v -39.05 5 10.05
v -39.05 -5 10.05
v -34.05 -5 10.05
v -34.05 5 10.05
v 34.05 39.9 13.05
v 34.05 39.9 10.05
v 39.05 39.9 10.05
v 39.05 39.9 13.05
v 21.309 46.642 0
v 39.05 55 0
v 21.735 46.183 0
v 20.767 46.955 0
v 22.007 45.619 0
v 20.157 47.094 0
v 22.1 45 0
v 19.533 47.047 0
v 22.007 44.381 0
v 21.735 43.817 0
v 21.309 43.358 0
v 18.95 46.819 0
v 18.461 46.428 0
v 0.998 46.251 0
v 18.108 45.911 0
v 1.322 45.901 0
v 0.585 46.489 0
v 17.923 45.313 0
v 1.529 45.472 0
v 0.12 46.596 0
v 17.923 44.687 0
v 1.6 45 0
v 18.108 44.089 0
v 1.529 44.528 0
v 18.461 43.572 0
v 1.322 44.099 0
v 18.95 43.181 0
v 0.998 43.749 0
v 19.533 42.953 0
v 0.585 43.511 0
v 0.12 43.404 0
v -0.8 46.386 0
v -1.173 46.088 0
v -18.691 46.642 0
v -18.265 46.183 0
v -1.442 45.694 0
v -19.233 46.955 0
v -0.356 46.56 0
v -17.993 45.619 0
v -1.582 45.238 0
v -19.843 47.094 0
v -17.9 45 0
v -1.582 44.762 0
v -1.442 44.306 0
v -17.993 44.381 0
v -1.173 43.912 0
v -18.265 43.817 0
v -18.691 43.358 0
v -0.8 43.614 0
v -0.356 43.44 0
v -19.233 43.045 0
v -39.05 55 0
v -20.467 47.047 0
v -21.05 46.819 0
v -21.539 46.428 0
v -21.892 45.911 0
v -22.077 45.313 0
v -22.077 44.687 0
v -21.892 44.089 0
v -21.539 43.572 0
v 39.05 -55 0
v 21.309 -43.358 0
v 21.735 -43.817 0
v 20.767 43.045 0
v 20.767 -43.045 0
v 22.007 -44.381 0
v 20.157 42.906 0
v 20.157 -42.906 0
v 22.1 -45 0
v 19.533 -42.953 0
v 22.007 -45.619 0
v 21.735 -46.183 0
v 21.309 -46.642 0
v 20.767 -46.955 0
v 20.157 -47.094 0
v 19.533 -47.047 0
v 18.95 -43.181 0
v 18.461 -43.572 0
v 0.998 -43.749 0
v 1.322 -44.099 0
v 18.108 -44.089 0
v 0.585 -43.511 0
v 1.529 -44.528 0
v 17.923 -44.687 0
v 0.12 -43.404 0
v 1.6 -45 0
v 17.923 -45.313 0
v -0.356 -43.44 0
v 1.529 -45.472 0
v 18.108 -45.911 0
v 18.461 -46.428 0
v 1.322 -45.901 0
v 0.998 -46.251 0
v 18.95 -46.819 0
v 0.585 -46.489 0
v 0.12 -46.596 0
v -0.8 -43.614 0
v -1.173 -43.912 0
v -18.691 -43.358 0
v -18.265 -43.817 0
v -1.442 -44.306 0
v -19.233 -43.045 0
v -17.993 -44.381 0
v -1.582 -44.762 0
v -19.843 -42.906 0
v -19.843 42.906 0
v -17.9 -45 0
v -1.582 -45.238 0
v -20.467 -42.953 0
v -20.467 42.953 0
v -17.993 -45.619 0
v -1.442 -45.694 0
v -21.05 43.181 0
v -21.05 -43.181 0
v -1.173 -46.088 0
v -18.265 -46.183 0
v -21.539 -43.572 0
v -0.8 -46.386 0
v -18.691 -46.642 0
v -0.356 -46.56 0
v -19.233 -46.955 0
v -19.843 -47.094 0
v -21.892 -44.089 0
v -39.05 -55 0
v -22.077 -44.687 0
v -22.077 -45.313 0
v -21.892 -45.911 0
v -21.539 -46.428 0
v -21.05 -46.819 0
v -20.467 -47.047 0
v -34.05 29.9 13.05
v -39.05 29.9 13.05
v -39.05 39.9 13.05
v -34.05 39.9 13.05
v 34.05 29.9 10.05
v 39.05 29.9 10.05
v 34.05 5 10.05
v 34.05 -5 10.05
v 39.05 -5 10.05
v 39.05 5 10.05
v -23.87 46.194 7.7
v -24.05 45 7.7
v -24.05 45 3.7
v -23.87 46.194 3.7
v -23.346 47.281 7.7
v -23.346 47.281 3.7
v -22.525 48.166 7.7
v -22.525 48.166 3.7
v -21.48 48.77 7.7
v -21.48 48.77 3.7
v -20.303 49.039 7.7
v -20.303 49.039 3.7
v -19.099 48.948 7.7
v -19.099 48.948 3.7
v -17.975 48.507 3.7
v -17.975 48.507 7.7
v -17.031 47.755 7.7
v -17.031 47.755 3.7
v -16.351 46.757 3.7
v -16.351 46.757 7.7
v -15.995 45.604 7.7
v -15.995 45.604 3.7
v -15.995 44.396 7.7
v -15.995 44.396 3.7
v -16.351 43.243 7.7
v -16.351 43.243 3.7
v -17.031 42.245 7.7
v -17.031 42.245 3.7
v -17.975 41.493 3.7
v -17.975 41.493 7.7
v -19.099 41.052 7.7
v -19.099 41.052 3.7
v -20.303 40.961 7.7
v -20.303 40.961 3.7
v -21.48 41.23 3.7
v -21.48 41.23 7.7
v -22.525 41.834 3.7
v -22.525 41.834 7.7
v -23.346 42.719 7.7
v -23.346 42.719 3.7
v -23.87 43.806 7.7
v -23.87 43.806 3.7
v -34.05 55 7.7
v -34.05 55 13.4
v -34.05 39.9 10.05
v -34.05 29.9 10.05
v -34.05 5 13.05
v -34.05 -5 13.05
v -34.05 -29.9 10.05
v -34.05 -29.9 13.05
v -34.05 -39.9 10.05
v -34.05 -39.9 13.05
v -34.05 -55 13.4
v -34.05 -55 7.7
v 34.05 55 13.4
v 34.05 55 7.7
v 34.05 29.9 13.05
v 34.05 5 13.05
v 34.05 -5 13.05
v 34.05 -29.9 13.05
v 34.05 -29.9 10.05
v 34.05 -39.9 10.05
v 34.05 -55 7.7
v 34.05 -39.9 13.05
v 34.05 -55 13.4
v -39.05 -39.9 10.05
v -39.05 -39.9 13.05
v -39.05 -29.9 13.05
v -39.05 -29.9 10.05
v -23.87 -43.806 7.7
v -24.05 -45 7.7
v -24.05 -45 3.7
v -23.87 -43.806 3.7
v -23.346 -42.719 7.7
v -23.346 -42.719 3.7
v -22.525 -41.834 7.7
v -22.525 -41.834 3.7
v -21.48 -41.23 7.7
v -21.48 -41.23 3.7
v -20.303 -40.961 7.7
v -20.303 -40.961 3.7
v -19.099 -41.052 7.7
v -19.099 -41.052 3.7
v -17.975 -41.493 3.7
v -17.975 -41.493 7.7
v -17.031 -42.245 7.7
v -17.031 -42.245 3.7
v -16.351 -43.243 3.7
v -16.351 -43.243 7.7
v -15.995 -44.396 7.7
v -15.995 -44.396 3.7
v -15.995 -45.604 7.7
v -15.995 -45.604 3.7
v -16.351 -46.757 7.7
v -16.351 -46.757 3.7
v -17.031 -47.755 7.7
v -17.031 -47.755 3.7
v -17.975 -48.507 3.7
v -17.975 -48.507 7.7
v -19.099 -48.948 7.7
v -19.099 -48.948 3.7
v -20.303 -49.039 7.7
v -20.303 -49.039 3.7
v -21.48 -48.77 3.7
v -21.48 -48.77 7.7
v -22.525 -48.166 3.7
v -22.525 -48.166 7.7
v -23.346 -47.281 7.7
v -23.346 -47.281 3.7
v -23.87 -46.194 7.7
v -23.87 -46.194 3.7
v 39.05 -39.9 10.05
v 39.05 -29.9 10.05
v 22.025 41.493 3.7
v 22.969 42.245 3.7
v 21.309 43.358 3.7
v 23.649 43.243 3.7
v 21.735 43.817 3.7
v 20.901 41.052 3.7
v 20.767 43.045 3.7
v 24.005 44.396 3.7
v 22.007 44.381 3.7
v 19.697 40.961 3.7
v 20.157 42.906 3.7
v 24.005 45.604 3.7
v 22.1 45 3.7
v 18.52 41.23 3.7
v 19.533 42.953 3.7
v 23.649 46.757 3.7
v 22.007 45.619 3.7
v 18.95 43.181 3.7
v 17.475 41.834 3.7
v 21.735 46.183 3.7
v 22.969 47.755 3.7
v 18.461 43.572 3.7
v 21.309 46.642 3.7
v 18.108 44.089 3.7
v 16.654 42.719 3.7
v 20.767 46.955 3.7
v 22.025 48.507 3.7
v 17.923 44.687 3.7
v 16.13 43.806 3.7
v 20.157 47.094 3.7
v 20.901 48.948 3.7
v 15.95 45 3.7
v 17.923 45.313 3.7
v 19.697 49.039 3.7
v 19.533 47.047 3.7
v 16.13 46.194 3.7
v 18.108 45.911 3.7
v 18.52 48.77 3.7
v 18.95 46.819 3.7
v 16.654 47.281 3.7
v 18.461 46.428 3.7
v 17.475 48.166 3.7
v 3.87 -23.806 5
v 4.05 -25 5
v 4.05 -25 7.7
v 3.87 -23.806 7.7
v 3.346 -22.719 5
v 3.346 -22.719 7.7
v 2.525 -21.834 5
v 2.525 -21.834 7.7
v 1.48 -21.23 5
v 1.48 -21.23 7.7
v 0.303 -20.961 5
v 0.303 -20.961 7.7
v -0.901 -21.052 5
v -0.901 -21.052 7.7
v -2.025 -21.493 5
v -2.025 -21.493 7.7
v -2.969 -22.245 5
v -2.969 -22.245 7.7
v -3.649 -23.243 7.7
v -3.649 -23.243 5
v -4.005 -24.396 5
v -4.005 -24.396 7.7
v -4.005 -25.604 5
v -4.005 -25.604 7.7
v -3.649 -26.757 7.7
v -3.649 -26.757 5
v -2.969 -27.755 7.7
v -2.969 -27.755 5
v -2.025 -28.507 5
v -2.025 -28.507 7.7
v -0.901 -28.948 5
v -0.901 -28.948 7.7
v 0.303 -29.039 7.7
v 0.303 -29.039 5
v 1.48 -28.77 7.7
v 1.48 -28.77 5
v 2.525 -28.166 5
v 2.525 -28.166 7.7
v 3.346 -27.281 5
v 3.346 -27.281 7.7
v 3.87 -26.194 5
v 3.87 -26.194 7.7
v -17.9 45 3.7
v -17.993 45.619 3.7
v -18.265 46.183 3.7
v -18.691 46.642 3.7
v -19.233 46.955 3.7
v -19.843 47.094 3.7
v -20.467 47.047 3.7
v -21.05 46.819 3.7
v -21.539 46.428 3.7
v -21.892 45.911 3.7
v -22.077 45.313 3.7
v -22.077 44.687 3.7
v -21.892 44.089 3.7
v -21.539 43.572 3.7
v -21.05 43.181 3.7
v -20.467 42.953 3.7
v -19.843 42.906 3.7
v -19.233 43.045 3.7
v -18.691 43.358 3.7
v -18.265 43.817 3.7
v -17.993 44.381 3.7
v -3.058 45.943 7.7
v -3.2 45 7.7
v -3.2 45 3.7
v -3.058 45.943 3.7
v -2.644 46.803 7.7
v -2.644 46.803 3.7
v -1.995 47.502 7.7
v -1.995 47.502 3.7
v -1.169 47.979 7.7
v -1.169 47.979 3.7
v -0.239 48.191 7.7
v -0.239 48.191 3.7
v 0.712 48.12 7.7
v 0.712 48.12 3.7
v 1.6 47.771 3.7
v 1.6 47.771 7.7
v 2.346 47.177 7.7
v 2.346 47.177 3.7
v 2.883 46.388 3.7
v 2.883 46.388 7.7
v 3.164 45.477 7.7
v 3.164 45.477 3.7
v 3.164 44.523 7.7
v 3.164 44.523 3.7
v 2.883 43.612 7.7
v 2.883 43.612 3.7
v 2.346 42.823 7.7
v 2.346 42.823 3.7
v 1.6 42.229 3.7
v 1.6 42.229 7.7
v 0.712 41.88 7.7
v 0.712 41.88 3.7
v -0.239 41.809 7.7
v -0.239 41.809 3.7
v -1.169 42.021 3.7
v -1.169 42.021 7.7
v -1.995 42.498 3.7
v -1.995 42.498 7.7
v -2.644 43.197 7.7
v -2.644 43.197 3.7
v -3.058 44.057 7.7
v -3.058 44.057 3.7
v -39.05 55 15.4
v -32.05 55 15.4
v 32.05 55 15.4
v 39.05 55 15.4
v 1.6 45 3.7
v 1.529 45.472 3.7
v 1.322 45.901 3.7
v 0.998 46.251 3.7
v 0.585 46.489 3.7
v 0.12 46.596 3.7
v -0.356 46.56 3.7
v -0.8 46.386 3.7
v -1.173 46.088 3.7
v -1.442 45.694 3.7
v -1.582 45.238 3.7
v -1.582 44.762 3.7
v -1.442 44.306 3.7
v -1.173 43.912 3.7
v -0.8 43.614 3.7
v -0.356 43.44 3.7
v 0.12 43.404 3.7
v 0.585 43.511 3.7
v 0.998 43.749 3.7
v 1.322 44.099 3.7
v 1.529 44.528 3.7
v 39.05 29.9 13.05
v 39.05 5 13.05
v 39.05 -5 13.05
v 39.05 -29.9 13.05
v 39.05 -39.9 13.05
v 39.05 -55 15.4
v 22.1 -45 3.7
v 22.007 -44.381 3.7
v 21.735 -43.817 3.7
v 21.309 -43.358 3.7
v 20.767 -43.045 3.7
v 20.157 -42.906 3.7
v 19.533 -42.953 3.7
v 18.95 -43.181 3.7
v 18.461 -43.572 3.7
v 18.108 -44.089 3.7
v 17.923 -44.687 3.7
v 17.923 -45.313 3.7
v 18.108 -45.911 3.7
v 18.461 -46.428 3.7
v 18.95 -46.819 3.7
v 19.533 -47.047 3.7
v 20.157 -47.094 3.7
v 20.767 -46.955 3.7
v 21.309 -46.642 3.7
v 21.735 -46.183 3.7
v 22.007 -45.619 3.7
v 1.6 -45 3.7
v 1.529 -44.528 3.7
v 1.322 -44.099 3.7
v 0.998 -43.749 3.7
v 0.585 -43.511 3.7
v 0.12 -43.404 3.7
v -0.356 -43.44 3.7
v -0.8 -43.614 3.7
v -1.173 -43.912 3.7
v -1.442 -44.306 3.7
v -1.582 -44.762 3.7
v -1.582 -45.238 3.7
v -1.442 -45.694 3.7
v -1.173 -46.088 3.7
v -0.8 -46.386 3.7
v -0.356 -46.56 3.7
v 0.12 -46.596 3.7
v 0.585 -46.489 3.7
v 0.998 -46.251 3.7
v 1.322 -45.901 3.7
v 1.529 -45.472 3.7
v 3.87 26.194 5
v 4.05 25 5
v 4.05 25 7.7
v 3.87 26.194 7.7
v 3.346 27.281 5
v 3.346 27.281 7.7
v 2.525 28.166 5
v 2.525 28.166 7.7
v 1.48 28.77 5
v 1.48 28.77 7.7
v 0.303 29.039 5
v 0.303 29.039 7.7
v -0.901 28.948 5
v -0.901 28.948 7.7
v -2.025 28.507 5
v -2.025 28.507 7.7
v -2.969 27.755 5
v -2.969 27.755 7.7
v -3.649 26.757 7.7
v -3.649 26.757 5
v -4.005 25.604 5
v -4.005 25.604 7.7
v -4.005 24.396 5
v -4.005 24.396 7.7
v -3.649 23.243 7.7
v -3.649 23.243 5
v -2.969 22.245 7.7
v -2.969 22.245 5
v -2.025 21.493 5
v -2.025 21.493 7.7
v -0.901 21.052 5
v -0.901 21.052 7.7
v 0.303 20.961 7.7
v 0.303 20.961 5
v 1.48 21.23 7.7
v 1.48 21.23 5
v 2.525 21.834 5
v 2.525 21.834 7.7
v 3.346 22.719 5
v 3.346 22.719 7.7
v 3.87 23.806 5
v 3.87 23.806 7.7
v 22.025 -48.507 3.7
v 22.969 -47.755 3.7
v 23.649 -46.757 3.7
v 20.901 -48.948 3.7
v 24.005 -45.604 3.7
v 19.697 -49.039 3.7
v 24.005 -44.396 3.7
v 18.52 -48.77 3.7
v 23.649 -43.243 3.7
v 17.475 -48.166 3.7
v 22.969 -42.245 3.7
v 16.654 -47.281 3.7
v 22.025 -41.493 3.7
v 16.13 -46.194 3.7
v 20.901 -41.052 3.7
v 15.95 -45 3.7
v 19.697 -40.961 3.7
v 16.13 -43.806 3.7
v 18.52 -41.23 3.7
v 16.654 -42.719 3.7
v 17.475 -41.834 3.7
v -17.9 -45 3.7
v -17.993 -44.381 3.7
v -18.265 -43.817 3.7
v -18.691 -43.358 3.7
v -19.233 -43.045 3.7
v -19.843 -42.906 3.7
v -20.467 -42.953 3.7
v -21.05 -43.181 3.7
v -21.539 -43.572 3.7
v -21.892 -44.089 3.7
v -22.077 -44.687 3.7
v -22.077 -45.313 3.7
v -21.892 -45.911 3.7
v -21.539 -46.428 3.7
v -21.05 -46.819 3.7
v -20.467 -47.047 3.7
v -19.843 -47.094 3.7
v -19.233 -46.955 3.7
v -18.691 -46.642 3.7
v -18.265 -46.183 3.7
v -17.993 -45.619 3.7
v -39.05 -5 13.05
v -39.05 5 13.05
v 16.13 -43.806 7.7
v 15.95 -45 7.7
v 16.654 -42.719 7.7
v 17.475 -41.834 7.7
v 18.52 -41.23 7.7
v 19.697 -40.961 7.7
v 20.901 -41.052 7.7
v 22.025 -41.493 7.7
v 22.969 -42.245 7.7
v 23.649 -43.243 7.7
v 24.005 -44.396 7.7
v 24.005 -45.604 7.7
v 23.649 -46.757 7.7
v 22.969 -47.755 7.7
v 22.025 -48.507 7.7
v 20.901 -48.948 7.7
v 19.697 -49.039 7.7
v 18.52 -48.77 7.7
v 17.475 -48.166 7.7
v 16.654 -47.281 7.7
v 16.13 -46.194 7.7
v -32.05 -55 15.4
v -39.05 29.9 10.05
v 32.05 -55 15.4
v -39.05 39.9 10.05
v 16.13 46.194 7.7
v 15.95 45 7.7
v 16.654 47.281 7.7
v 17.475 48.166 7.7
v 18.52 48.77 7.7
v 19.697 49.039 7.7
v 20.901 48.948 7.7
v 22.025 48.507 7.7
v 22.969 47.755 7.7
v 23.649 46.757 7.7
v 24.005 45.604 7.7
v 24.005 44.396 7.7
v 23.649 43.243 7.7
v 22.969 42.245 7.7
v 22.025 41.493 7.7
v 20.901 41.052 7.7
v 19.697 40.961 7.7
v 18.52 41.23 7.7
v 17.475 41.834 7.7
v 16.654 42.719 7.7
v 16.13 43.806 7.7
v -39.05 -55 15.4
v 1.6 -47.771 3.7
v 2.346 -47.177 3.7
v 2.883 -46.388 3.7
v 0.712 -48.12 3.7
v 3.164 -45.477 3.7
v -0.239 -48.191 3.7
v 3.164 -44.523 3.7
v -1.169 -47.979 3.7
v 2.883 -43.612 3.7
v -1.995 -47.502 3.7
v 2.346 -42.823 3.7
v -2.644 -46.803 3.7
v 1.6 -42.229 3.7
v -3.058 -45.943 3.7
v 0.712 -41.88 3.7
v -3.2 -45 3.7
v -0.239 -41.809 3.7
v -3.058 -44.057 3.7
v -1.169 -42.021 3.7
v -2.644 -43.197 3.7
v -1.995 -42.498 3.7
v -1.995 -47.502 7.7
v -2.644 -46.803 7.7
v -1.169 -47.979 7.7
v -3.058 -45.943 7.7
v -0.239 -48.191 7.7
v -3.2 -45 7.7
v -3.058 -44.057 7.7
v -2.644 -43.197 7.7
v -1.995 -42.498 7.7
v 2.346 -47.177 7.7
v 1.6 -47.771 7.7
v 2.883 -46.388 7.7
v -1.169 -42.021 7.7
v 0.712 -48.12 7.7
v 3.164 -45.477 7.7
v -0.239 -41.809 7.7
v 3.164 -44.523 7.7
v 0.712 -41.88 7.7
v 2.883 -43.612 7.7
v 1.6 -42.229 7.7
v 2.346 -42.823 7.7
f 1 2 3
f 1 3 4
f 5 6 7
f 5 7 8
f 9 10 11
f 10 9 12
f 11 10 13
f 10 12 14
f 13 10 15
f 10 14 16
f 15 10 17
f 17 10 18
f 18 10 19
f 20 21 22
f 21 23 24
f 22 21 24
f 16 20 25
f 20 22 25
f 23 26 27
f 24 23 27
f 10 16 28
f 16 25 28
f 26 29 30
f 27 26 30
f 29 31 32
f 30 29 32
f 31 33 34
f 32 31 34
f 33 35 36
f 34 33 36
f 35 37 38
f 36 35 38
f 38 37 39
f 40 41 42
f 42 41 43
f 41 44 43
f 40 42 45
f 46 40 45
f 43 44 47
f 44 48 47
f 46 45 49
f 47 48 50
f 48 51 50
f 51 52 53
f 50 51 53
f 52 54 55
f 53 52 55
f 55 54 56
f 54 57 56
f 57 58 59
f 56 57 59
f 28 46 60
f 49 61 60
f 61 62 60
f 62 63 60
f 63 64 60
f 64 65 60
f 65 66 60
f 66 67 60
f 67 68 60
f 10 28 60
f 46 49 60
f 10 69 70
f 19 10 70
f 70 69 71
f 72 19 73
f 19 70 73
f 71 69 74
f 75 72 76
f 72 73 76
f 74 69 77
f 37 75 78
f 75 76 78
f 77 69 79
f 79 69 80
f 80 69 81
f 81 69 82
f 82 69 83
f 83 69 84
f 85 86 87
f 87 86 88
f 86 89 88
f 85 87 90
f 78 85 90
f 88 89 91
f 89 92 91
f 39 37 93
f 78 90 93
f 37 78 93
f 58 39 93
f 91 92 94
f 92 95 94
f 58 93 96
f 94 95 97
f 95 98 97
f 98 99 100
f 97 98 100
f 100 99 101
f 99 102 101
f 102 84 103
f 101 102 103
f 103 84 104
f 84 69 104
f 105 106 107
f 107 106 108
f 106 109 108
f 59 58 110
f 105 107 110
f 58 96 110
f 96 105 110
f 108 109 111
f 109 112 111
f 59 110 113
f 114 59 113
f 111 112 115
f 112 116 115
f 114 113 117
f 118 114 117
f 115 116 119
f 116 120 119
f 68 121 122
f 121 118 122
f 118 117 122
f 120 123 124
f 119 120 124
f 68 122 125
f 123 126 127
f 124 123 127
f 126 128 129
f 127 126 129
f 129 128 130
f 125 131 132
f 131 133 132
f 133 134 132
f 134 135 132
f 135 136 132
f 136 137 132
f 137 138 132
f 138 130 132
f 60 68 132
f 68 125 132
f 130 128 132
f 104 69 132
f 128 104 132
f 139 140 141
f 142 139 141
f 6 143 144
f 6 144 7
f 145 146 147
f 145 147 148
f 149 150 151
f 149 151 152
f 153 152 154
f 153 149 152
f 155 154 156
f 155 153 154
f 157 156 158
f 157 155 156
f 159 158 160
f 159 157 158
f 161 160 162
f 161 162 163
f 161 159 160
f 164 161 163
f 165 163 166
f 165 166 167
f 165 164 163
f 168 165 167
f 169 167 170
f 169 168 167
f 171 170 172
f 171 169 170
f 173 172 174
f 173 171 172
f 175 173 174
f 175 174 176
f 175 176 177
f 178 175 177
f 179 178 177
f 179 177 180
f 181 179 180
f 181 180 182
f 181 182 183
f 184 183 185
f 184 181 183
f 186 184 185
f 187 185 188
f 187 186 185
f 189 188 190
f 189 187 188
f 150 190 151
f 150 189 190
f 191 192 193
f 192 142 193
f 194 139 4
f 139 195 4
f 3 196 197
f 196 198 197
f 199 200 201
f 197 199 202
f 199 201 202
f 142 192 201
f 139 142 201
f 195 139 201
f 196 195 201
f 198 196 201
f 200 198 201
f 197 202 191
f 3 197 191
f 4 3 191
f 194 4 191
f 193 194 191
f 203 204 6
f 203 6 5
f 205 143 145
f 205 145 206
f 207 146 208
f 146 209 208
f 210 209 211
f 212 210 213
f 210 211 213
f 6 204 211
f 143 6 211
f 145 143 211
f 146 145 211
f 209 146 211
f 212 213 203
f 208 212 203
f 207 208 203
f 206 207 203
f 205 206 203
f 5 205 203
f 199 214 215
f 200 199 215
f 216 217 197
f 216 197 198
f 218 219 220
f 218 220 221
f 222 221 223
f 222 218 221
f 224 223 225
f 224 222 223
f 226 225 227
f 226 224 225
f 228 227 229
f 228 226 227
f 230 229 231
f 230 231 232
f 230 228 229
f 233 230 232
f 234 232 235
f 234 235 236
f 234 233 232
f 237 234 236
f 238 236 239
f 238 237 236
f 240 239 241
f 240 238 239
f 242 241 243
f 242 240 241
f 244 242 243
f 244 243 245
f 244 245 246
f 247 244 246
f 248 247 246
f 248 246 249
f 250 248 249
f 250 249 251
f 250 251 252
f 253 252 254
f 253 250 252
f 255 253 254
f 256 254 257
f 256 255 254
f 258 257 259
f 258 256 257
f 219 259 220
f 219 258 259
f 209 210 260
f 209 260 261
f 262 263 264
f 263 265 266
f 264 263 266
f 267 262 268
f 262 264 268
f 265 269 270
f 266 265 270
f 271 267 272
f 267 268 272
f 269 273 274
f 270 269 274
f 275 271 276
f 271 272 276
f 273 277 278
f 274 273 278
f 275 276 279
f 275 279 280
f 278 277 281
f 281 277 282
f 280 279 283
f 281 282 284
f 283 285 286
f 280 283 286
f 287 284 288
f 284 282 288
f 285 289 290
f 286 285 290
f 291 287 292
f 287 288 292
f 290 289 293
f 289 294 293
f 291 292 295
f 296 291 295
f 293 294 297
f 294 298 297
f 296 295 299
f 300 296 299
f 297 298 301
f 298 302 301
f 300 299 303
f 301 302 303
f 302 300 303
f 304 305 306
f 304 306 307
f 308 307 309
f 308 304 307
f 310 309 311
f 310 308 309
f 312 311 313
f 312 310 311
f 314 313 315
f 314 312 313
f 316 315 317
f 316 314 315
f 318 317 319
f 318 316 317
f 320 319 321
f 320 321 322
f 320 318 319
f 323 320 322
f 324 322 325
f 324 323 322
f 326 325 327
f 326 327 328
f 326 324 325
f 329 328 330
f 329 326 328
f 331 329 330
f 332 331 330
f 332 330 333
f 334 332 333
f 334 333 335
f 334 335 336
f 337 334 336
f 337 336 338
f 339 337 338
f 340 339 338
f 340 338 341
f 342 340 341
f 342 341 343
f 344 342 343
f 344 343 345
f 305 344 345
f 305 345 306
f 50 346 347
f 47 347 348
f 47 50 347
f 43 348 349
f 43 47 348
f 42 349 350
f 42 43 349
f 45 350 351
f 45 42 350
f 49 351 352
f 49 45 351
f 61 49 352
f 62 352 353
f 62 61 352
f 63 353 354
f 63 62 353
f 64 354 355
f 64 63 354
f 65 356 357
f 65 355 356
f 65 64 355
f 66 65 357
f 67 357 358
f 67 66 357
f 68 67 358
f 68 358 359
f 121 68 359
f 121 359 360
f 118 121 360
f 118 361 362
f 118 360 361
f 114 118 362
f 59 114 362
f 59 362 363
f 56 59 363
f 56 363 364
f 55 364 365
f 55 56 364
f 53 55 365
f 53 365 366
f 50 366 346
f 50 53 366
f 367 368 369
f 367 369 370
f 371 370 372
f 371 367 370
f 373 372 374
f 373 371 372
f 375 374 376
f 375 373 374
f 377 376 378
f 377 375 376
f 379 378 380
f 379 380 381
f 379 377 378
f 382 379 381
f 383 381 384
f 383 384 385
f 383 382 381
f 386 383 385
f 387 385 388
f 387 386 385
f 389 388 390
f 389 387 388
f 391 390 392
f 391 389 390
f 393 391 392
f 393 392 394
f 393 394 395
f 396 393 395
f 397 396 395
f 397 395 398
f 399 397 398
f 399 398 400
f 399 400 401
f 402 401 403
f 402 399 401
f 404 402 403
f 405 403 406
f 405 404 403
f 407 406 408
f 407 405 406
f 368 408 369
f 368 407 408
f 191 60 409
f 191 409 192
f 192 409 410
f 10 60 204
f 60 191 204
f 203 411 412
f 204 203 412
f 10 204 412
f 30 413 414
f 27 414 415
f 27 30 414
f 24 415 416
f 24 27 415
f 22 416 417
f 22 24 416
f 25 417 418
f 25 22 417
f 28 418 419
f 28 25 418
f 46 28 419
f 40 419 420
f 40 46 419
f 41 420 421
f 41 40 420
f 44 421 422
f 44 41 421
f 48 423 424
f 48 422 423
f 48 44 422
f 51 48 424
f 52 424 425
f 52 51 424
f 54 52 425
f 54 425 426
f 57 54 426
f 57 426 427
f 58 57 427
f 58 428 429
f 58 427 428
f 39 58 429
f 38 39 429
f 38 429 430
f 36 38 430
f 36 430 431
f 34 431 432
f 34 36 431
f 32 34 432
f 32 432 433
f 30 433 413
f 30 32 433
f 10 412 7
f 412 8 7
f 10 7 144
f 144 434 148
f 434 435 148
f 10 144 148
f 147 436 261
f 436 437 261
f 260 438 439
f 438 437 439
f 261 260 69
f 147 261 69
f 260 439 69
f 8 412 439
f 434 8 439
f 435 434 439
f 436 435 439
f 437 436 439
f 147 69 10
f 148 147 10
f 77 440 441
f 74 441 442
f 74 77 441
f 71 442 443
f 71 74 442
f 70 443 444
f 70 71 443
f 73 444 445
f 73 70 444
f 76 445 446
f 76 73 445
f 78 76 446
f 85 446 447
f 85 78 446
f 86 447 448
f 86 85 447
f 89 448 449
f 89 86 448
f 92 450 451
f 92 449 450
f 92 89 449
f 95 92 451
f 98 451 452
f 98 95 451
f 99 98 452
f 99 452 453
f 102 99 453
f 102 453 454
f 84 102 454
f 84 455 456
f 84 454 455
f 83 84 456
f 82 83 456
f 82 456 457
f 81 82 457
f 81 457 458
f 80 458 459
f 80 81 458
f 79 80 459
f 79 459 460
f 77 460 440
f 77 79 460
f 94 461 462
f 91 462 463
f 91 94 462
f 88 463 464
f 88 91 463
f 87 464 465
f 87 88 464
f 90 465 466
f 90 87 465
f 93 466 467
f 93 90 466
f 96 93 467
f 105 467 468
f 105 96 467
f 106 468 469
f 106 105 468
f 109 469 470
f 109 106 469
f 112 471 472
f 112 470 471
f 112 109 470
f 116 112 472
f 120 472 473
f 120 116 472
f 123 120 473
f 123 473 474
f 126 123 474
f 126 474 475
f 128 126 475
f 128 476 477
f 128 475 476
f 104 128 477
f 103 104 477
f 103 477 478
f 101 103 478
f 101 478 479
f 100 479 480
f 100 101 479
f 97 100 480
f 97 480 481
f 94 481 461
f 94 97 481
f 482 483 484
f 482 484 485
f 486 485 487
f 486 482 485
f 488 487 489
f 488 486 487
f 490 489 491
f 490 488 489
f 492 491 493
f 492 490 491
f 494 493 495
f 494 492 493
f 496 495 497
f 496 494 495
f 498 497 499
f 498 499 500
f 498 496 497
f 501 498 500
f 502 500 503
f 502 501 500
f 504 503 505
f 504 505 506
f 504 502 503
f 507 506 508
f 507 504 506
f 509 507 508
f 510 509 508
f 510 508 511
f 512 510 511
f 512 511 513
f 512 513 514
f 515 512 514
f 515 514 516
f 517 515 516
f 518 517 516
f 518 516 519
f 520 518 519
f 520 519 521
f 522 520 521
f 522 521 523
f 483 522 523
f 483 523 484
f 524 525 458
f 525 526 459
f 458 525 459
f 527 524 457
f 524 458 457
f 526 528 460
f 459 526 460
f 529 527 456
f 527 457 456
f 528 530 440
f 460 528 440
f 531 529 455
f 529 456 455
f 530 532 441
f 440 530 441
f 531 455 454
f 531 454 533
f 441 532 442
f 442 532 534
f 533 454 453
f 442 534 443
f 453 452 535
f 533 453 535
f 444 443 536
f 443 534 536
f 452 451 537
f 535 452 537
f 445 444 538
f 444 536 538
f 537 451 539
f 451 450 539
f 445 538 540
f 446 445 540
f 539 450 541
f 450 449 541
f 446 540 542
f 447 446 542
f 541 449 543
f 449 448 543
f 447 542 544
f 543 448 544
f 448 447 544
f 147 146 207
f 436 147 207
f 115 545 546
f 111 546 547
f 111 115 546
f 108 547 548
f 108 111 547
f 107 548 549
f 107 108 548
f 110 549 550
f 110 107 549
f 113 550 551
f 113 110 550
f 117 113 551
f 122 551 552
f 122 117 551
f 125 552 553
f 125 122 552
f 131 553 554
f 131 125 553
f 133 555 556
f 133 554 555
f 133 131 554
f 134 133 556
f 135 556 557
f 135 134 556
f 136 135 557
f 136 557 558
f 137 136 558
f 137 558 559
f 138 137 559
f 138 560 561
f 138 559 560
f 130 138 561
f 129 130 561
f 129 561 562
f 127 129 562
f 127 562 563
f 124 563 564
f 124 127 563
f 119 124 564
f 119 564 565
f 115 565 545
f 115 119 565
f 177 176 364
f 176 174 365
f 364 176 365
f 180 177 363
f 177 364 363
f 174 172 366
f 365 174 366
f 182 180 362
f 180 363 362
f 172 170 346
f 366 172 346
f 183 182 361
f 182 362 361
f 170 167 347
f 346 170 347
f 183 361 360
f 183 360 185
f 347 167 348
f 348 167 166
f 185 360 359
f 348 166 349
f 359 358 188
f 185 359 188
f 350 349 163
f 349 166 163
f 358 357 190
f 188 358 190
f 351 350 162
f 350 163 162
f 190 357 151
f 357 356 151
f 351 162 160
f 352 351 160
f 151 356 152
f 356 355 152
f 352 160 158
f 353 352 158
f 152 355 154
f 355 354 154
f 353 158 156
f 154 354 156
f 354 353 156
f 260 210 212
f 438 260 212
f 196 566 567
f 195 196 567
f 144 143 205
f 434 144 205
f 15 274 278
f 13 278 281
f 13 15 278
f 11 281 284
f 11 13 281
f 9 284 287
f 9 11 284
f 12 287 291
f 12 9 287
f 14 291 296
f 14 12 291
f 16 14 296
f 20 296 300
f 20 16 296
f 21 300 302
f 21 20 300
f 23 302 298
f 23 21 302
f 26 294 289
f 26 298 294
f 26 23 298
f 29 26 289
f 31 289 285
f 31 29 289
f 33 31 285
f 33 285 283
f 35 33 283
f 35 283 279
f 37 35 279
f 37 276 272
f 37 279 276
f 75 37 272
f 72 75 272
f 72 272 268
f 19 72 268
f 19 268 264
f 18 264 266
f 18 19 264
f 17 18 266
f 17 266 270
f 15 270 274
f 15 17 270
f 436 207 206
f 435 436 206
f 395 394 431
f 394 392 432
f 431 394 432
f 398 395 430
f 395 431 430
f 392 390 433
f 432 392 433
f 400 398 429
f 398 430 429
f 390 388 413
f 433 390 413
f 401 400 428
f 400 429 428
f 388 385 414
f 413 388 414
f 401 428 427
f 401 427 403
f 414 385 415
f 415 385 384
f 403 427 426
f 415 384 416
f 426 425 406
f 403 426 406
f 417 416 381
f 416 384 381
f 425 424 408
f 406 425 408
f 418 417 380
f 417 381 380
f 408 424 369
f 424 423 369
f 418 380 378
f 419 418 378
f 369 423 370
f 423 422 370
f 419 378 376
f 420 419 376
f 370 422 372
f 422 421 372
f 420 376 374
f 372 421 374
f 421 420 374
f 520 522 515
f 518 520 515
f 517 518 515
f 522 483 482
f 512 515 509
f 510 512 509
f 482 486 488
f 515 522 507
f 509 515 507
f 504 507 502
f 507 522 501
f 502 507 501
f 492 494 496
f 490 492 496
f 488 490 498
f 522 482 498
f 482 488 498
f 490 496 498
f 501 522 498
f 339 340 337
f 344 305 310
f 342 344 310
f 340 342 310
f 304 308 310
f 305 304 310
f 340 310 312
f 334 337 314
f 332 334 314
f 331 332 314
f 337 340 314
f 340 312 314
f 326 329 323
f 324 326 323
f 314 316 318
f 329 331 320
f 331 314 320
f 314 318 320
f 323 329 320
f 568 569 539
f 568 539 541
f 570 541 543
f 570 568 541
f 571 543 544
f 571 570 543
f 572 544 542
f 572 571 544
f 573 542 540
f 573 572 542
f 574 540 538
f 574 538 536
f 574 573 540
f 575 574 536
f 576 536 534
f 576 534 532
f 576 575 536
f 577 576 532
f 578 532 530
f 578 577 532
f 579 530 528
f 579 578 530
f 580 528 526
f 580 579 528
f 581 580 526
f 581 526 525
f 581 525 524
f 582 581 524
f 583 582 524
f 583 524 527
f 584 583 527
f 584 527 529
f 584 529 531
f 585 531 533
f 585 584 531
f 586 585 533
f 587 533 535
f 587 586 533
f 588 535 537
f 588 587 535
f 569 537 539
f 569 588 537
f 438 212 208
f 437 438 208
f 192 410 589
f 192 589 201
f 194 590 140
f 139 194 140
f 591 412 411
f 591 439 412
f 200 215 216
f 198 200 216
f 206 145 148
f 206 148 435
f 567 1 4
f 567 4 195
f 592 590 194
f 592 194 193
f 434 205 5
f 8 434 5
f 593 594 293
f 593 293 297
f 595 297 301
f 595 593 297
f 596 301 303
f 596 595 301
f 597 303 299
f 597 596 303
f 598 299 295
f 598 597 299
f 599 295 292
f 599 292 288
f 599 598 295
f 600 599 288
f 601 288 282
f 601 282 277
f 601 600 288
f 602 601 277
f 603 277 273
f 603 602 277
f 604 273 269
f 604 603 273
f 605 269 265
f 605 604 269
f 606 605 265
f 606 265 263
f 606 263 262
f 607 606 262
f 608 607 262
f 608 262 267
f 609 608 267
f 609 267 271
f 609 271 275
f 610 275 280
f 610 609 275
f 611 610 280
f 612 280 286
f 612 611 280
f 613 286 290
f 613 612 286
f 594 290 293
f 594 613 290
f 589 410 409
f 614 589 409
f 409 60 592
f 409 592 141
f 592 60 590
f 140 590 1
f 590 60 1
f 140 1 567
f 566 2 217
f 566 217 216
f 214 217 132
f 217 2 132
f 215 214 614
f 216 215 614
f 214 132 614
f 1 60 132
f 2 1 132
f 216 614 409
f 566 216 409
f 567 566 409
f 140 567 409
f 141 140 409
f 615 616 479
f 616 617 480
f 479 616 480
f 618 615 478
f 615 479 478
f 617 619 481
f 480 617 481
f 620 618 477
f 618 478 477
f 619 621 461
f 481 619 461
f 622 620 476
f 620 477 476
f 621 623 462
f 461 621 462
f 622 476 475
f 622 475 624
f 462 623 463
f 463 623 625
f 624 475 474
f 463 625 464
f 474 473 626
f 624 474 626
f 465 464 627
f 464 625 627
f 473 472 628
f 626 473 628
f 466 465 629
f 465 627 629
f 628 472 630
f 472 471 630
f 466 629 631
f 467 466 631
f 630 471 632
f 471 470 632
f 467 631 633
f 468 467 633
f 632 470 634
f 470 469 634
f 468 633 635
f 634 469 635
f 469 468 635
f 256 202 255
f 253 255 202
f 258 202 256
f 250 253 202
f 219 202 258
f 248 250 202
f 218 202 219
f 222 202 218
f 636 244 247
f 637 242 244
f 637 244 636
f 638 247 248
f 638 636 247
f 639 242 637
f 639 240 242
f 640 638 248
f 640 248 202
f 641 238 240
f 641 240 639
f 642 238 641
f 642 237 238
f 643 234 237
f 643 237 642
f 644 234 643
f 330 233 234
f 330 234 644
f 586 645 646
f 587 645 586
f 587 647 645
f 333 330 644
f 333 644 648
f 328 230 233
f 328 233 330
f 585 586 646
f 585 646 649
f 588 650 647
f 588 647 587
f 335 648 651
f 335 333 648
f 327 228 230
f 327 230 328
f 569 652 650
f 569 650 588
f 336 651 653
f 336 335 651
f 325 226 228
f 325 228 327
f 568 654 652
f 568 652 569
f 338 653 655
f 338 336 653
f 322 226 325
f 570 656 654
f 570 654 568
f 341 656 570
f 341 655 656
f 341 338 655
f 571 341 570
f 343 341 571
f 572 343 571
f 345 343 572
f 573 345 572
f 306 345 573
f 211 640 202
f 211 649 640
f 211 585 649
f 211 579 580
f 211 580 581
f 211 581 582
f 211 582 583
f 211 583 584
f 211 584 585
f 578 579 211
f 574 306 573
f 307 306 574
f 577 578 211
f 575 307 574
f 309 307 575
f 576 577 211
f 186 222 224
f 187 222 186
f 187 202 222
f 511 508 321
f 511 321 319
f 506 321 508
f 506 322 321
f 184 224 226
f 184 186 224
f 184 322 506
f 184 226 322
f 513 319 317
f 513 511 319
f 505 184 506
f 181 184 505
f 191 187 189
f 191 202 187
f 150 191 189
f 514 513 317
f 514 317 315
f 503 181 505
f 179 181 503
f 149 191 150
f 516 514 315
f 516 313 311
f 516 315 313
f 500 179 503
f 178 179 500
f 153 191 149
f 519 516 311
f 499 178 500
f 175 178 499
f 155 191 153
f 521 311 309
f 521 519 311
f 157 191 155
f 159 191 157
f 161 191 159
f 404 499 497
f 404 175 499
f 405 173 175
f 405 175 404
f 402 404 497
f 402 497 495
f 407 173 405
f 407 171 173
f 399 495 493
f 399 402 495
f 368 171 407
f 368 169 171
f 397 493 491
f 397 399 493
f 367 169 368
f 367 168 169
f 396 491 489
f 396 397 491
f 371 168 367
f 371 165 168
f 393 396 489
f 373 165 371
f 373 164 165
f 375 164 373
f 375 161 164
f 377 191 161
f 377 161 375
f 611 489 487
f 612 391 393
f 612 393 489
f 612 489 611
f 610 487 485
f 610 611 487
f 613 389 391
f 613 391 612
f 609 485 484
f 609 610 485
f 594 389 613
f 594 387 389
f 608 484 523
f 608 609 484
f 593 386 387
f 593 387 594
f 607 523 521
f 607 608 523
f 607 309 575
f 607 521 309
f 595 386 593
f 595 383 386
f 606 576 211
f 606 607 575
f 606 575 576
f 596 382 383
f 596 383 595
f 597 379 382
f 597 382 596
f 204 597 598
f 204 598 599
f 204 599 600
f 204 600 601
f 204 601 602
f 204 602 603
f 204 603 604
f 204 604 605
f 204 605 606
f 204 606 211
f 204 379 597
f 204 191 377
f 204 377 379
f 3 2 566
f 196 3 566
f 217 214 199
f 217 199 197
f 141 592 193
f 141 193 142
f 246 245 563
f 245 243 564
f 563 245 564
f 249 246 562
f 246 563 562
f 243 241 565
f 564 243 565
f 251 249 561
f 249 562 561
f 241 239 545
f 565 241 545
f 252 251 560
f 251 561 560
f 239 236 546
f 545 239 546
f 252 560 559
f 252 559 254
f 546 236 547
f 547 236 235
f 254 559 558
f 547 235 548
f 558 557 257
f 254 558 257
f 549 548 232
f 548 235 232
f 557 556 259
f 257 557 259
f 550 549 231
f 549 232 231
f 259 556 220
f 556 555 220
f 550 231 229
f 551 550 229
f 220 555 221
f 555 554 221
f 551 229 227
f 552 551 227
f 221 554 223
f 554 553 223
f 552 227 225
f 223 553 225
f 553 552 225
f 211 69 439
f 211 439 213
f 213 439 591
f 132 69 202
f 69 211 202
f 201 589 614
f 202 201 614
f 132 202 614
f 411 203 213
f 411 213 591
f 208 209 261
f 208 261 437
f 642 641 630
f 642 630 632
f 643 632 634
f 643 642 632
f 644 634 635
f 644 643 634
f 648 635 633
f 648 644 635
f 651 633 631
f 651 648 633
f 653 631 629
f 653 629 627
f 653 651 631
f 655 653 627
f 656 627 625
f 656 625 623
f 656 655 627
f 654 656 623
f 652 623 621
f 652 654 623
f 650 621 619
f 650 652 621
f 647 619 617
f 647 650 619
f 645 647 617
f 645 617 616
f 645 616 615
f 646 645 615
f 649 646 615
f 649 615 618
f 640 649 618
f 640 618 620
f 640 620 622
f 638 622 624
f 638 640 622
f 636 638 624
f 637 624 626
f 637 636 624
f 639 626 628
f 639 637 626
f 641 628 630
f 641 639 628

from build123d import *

# Parameters (mm, degrees)
SKETCH1_W                = 68.1
SKETCH1_H                = 110
SKETCH1_R                = 2.1
SKETCH1_R_2              = 4.05
SKETCH1_R_3              = 1.6
BOSS_EXTRUDE1_DEPTH      = 7.7
SKETCH2_R                = 7.334333348
SKETCH2_R_2              = 11.073656437
BOSS_EXTRUDE2_DEPTH      = 5
SKETCH3_R                = 4.05
SKETCH3_R_2              = 3.2
CUT_EXTRUDE1_DEPTH       = 4
SKETCH4_W                = 68.1
SKETCH4_H                = 5
BOSS_EXTRUDE3_DEPTH      = 7.7
BOSS_EXTRUDE3_DEPTH_BACK = 7.7
BOSS_EXTRUDE4_DEPTH      = 115
SKETCH8_W                = 94.544818424
SKETCH8_H                = 30.580965824
CUT_EXTRUDE2_DEPTH       = 10
SKETCH9_W                = 3
SKETCH9_H                = 10
CUT_EXTRUDE3_DEPTH       = 79.1


with BuildPart() as part:
    # Sketch1 → Boss-Extrude1 (new body)
    with BuildSketch(Plane.XY):
        Rectangle(SKETCH1_W, SKETCH1_H)
        with Locations((20, 45)):
            Circle(SKETCH1_R, mode=Mode.SUBTRACT)
        with Locations((-20, 45)):
            Circle(SKETCH1_R, mode=Mode.SUBTRACT)
        with Locations((20, -45)):
            Circle(SKETCH1_R, mode=Mode.SUBTRACT)
        with Locations((-20, -45)):
            Circle(SKETCH1_R, mode=Mode.SUBTRACT)
        with Locations((0, 25)):
            Circle(SKETCH1_R_2, mode=Mode.SUBTRACT)
        with Locations((0, -25)):
            Circle(SKETCH1_R_2, mode=Mode.SUBTRACT)
        with Locations((0, 45)):
            Circle(SKETCH1_R_3, mode=Mode.SUBTRACT)
        with Locations((0, -45)):
            Circle(SKETCH1_R_3, mode=Mode.SUBTRACT)
    extrude(amount=BOSS_EXTRUDE1_DEPTH)

    # Sketch2 → Boss-Extrude2 (add)
    with BuildSketch(Plane(origin=(0, 0, 0), x_dir=(-1, 0, 0), z_dir=(0, 0, -1))):
        with Locations((0, 25)):
            Circle(SKETCH2_R)
        with Locations((0, -25)):
            Circle(SKETCH2_R_2)
    extrude(amount=-BOSS_EXTRUDE2_DEPTH)

    # Sketch3 → Cut-Extrude1 (cut)
    with BuildSketch(Plane(origin=(0, 0, 7.7), x_dir=(-1, 0, 0), z_dir=(0, 0, -1))):
        with Locations((-20, 45)):
            Circle(SKETCH3_R)
        with Locations((20, 45)):
            Circle(SKETCH3_R)
        with Locations((-20, -45)):
            Circle(SKETCH3_R)
        with Locations((20, -45)):
            Circle(SKETCH3_R)
        with Locations((0, 45)):
            Circle(SKETCH3_R_2)
        with Locations((0, -45)):
            Circle(SKETCH3_R_2)
    extrude(amount=CUT_EXTRUDE1_DEPTH, mode=Mode.SUBTRACT)

    # Sketch4 → Boss-Extrude3 (add, two sides)
    with BuildSketch(Plane.XY.offset(7.7)) as boss_extrude3_sk:
        with Locations((0, 57.5)):
            Rectangle(SKETCH4_W, SKETCH4_H)
    extrude(amount=BOSS_EXTRUDE3_DEPTH)
    extrude(boss_extrude3_sk.sketch, amount=-BOSS_EXTRUDE3_DEPTH_BACK)

    # Sketch7 → Boss-Extrude4 (add)
    with BuildSketch(Plane.XZ.offset(55)):
        Polygon((-34.05, 15.4), (-32.05, 15.4), (-34.05, 13.4), (-34.05, 0), (-39.05, 0), (-39.05, 15.4), align=None)
        Polygon((39.05, 0), (34.05, 0), (34.05, 13.4), (32.05, 15.4), (34.05, 15.4), (39.05, 15.4), align=None)
    extrude(amount=-BOSS_EXTRUDE4_DEPTH)

    # Sketch8 → Cut-Extrude2 (cut)
    with BuildSketch(Plane.XZ.offset(-55)):
        with Locations((-0.280192095, 7.459835347)):
            Rectangle(SKETCH8_W, SKETCH8_H)
    extrude(amount=-CUT_EXTRUDE2_DEPTH, mode=Mode.SUBTRACT)

    # Sketch9 → Cut-Extrude3 (cut, through all)
    with BuildSketch(Plane.ZY.offset(39.05)):
        with Locations((11.55, 0)):
            Rectangle(SKETCH9_W, SKETCH9_H)
        with Locations((11.55, 34.9)):
            Rectangle(SKETCH9_W, SKETCH9_H)
        with Locations((11.55, -34.9)):
            Rectangle(SKETCH9_W, SKETCH9_H)
    extrude(amount=-CUT_EXTRUDE3_DEPTH, mode=Mode.SUBTRACT)


solid = part.part
